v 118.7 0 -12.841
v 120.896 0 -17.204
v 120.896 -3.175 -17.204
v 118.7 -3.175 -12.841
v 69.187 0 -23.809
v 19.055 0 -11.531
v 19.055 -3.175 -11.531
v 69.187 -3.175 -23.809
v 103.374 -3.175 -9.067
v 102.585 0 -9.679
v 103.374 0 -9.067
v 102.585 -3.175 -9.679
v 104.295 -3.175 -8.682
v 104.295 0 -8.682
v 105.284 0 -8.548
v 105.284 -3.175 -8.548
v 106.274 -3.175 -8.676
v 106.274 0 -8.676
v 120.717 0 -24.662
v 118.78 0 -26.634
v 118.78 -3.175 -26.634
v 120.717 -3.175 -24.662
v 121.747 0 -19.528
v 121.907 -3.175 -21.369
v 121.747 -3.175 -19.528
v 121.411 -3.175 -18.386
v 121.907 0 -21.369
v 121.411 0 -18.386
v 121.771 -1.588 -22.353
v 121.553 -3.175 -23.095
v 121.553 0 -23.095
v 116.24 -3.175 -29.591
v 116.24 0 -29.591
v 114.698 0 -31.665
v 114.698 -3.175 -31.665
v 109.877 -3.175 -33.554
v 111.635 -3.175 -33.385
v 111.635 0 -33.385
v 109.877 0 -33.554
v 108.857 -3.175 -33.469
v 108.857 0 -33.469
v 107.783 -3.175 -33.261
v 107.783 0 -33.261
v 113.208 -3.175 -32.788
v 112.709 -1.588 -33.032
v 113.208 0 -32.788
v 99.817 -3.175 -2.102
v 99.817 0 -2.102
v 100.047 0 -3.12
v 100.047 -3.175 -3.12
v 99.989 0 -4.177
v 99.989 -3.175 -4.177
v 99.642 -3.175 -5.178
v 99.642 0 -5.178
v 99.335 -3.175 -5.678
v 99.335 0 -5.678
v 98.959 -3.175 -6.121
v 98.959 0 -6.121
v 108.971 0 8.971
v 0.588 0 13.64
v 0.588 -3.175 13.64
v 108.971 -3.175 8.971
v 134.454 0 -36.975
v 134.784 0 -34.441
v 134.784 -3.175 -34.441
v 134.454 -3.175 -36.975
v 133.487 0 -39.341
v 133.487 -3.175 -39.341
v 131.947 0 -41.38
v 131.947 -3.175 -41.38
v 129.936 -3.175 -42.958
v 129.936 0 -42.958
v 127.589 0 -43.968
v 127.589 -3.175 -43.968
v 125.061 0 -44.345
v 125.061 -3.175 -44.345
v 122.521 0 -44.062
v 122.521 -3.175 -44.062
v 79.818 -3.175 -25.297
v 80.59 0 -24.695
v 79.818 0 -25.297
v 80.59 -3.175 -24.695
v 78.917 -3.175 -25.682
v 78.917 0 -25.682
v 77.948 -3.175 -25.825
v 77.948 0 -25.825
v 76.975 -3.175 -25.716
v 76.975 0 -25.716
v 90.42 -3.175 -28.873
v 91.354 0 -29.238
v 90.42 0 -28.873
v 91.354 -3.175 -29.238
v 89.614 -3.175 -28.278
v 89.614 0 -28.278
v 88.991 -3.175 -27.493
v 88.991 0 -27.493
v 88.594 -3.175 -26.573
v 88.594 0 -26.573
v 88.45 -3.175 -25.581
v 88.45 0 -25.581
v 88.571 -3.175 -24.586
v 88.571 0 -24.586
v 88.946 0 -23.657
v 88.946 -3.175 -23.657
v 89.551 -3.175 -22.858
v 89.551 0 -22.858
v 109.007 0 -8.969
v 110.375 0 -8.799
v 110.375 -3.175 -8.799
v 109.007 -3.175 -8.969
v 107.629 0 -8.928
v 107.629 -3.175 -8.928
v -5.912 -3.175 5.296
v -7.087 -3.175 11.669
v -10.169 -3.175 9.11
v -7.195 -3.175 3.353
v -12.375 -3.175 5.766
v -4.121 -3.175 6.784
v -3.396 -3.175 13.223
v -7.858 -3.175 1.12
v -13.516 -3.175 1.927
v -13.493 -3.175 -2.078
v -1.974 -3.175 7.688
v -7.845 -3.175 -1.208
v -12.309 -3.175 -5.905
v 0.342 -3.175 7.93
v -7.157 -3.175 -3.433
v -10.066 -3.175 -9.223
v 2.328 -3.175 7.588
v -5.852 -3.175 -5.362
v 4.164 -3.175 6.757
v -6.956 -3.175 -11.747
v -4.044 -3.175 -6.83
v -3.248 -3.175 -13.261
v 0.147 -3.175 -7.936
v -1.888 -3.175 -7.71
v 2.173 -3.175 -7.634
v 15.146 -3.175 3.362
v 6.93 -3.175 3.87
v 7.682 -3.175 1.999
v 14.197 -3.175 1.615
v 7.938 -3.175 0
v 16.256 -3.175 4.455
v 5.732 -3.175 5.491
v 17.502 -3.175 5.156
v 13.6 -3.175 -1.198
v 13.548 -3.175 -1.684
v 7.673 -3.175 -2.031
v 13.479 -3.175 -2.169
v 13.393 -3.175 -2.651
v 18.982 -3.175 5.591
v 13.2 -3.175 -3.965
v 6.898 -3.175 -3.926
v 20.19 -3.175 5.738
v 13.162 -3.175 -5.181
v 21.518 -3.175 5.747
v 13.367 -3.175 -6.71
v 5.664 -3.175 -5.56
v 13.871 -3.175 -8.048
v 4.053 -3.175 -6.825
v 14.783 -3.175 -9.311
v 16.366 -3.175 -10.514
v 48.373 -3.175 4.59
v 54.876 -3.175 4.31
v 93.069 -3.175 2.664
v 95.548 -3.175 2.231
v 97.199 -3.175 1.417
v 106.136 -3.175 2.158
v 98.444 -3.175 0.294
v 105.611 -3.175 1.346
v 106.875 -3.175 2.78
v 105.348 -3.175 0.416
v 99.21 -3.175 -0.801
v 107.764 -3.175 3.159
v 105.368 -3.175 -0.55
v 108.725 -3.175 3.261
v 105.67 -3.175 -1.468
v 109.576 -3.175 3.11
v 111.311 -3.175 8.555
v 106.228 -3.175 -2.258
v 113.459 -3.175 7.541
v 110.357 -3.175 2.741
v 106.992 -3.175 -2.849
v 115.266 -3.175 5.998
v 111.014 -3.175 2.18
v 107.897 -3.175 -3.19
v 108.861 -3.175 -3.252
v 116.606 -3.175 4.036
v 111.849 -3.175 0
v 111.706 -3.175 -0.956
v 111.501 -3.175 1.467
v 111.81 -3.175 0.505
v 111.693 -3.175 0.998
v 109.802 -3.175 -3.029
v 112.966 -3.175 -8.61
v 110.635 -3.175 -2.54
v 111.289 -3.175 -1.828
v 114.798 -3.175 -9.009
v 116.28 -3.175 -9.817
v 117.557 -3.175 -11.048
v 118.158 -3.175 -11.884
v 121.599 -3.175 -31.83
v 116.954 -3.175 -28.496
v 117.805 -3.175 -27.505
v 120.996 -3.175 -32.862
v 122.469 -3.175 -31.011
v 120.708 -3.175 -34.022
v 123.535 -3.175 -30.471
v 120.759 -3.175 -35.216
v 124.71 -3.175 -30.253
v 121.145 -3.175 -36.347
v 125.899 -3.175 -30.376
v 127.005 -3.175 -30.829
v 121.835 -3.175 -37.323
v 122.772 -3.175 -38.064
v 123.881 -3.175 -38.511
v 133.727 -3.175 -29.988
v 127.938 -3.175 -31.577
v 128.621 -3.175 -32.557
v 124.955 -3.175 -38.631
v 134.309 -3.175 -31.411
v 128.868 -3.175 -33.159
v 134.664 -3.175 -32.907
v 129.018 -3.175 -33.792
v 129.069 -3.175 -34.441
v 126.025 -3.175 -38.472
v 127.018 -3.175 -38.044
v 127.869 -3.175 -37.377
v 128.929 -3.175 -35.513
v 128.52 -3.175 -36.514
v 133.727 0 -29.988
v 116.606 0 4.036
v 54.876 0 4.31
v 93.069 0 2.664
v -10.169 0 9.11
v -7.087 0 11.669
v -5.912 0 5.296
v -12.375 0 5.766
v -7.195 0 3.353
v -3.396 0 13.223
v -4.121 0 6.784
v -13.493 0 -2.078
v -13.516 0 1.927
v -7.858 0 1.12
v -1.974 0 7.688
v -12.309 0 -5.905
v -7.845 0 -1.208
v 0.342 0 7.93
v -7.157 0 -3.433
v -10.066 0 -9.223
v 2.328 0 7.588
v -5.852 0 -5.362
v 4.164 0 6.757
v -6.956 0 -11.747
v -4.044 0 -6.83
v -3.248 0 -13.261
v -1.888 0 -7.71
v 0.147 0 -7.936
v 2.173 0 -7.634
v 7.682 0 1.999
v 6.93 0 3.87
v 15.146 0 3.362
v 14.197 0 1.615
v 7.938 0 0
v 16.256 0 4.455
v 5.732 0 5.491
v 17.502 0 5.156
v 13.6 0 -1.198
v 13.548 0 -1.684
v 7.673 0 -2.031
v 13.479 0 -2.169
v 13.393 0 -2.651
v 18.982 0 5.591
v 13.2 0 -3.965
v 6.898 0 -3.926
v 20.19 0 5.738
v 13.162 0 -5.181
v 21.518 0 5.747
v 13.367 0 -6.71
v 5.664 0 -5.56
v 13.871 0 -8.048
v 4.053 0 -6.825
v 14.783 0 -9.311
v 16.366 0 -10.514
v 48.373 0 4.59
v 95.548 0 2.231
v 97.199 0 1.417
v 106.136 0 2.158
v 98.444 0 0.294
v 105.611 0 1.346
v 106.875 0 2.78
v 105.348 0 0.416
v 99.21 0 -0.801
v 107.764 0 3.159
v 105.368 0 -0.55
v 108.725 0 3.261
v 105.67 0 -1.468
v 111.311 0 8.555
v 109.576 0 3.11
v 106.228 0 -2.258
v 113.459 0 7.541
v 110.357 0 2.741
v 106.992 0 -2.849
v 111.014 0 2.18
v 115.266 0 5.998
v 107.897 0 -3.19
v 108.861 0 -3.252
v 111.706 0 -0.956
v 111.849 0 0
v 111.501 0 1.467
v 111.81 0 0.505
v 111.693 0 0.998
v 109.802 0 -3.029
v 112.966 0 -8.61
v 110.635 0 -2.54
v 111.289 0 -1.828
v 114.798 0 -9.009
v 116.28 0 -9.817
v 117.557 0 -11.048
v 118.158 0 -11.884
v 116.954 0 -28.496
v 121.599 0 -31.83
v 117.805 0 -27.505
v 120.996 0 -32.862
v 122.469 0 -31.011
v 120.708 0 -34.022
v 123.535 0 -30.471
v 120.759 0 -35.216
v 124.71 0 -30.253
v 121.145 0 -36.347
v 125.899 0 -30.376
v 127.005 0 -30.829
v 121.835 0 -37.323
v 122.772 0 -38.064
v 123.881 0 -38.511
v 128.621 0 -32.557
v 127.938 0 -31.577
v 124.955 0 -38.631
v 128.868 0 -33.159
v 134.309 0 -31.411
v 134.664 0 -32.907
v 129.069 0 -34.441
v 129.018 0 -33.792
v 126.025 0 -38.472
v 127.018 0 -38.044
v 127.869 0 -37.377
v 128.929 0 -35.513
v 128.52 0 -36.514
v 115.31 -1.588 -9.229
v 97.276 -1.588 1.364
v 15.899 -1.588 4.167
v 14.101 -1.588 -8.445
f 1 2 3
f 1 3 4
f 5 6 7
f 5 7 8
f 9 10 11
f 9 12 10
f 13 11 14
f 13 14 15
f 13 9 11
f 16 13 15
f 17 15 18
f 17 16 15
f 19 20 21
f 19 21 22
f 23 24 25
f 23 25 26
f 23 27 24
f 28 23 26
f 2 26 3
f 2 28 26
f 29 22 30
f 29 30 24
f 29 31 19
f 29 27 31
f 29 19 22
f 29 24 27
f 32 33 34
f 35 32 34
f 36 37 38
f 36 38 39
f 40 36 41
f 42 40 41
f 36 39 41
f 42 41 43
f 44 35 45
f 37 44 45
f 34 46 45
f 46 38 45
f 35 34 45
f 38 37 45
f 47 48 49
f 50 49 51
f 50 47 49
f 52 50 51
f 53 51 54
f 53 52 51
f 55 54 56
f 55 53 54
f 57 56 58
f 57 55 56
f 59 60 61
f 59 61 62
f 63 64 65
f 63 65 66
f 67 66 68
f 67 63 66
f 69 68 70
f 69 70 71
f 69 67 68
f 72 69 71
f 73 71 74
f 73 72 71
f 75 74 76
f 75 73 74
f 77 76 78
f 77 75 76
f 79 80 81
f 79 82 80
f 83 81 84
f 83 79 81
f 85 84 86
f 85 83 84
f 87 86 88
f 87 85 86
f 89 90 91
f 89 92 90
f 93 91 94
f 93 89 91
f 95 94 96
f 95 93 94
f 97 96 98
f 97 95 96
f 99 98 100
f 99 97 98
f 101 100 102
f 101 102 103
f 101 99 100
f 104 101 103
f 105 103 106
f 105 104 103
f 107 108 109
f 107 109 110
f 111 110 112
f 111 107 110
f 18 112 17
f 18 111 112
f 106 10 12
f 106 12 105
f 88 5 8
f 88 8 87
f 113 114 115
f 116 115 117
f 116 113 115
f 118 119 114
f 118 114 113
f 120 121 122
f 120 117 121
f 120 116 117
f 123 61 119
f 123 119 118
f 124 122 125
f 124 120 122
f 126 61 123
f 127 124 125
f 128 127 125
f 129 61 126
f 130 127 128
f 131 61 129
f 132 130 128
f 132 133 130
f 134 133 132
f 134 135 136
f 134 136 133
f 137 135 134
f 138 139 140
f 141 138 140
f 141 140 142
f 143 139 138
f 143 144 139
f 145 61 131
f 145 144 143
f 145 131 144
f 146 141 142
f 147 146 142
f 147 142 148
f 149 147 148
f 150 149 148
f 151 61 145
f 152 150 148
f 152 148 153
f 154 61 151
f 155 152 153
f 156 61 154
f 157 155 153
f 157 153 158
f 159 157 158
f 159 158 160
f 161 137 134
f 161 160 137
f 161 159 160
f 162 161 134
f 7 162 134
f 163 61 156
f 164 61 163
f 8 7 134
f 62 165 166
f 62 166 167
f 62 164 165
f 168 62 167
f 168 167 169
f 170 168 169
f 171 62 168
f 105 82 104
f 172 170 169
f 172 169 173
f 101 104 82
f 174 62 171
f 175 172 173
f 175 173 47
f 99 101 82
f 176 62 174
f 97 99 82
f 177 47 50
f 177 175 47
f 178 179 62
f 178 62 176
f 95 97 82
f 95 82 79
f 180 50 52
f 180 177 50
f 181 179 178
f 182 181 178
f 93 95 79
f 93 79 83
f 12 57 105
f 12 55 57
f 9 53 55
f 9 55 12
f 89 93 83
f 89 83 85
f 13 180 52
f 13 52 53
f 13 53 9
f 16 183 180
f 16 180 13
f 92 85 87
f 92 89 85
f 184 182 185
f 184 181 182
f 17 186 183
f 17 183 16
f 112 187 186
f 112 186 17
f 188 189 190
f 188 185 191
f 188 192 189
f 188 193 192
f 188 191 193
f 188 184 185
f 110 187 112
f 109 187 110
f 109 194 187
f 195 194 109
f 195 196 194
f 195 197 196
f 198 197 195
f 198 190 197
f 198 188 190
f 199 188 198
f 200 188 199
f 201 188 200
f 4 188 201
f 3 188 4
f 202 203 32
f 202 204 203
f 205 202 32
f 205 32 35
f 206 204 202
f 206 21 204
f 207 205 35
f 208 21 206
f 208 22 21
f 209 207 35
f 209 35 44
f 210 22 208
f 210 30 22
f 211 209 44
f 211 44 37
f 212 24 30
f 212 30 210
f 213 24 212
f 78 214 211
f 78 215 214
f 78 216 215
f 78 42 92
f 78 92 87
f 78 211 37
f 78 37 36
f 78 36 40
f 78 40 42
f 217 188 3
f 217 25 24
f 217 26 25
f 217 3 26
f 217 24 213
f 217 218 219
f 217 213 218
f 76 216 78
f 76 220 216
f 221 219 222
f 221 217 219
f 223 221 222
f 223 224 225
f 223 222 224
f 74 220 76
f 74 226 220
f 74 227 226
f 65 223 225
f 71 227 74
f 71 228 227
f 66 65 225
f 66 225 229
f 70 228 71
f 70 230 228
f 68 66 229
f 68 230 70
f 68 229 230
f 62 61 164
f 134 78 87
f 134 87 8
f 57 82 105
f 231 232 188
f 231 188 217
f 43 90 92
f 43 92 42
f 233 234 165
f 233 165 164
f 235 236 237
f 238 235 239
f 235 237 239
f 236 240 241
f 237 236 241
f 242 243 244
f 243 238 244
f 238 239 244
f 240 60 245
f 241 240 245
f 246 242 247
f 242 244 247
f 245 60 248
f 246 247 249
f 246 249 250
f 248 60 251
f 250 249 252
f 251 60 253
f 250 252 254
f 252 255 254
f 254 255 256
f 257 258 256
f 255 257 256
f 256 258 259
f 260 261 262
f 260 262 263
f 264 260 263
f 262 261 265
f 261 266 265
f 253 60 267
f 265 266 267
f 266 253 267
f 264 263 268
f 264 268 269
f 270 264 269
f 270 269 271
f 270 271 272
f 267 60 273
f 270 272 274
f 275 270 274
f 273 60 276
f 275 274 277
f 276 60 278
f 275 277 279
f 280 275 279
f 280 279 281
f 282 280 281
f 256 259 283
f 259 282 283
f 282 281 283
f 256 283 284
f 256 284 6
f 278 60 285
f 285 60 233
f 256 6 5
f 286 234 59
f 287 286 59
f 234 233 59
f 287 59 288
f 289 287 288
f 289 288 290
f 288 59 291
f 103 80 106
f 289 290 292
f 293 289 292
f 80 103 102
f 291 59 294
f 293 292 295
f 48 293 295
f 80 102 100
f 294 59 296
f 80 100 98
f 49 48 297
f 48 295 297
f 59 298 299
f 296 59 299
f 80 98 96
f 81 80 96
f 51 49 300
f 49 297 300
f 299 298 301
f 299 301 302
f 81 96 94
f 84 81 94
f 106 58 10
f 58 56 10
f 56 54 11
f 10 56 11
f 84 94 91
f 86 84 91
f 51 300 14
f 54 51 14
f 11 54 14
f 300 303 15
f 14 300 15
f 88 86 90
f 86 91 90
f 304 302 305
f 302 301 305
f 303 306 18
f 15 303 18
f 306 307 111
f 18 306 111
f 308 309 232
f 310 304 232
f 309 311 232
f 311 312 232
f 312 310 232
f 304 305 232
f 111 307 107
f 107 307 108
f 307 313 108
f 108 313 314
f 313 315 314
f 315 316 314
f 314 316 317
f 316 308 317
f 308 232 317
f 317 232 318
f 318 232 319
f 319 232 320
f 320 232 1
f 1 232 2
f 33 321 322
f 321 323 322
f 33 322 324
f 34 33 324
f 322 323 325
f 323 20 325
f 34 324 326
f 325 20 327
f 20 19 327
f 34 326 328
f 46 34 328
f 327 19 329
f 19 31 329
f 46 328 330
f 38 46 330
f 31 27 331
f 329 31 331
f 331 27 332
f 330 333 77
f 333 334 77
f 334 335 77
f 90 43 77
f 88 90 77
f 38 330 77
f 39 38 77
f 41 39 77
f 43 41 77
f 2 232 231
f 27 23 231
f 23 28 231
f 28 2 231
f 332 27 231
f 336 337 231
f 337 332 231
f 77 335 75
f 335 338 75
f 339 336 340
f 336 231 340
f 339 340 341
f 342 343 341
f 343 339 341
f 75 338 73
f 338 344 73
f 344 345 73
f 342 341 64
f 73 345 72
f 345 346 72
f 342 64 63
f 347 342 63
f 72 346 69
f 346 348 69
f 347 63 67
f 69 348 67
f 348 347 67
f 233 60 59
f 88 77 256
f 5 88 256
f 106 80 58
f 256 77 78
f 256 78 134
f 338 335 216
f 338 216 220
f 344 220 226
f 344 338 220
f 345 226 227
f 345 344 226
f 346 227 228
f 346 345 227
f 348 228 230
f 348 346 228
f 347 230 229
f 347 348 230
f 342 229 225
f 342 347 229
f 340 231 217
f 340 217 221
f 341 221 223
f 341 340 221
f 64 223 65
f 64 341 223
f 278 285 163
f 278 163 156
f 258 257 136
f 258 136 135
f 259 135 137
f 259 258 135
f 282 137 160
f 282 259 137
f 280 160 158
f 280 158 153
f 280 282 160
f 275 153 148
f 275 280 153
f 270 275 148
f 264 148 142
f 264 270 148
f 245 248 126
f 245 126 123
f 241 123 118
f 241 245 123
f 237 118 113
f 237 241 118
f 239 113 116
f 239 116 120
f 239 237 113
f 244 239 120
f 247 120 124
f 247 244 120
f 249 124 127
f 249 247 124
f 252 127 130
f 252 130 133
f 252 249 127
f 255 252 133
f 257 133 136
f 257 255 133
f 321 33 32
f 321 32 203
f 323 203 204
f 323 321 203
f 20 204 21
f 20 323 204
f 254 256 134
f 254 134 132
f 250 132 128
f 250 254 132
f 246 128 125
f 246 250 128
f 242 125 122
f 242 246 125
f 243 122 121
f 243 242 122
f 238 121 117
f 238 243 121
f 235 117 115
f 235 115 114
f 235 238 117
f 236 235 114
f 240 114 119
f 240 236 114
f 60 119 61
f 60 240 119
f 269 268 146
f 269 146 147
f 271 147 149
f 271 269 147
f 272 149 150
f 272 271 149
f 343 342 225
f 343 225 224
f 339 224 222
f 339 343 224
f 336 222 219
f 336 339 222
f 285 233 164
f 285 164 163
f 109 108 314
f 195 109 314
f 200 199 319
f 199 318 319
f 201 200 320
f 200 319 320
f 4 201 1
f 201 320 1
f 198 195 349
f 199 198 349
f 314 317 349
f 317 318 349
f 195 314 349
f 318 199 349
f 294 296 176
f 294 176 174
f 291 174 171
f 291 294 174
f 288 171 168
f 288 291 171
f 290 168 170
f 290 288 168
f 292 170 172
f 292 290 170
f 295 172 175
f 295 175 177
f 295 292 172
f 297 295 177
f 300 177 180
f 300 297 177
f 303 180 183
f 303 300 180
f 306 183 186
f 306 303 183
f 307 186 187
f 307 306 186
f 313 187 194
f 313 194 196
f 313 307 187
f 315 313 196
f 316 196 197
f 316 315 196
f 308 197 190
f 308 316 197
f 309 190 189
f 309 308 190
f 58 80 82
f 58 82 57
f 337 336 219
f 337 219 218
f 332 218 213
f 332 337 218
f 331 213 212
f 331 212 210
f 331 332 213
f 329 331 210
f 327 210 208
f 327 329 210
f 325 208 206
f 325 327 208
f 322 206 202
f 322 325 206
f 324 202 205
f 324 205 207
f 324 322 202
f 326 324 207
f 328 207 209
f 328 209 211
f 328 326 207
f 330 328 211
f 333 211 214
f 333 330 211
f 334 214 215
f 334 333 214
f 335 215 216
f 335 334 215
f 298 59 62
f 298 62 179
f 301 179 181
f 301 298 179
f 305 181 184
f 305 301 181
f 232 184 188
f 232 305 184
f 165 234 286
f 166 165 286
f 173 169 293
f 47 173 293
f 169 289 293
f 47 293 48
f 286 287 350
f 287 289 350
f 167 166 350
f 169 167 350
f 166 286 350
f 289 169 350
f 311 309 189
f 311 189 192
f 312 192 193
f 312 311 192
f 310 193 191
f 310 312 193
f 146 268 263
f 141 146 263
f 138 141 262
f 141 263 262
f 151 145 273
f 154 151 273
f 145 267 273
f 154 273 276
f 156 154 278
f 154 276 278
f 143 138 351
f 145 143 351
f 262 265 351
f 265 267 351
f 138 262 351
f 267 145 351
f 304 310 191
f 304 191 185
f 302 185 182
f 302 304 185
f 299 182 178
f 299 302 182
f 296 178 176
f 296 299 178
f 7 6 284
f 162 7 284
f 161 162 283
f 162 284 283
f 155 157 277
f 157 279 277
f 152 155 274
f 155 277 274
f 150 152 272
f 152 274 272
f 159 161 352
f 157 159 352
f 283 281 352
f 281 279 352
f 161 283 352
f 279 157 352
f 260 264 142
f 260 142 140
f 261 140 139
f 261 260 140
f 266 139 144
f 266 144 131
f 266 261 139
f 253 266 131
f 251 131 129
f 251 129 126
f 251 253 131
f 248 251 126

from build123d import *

# Parameters (mm, degrees)
BOSS_EXTRUDE4_DEPTH = 3.175
FILLET2_R           = 3.81


with BuildPart() as part:
    # Sketch1 → Boss-Extrude4 (new body)
    with BuildSketch(Plane(origin=(0, 0, 0), x_dir=(1, 0, 0), z_dir=(0, 1, 0))):
        with BuildLine():
            ThreePointArc((134.783763158, 34.440613651), (130.992755953, 42.233924829), (122.521356715, 44.06226552))
            ThreePointArc((122.521356715, 44.06226552), (117.722413764, 41.291147284), (115.162703171, 36.376187325))
            Line((115.162703171, 36.376187325), (123.88082197, 38.511312519))
            ThreePointArc((123.88082197, 38.511312519), (127.464875494, 37.737783765), (129.068763158, 34.440613651))
            ThreePointArc((129.068763158, 34.440613651), (128.955414212, 33.4725006), (128.621498601, 32.556754332))
            Line((128.621498601, 32.556754332), (124.58688197, 24.538885311))
            ThreePointArc((124.58688197, 24.538885311), (129.950478116, 25.932006306), (133.726592386, 29.98785526))
            ThreePointArc((133.726592386, 29.98785526), (134.515847468, 32.152346439), (134.783763158, 34.440613651))
        make_face()
        with BuildLine():
            Line((123.88082197, 38.511312519), (115.162703171, 36.376187325))
            ThreePointArc((115.162703171, 36.376187325), (115.052676855, 35.70414645), (114.98908268, 35.026134276))
            ThreePointArc((114.98908268, 35.026134276), (117.127915131, 28.270630543), (123.232258698, 24.672238604))
            ThreePointArc((123.232258698, 24.672238604), (123.907277135, 24.582267295), (124.58688197, 24.538885311))
            Line((124.58688197, 24.538885311), (128.621498601, 32.556754332))
            ThreePointArc((128.621498601, 32.556754332), (121.5989813, 31.830236182), (123.88082197, 38.511312519))
        make_face()
        with BuildLine():
            Line((122.521356715, 44.06226552), (-3.247611444, 13.260609947))
            ThreePointArc((-3.247611444, 13.260609947), (3.178857668, 13.277259513), (8.900967118, 10.351982448))
            Line((8.900967118, 10.351982448), (70.354618788, 25.402389875))
            Line((70.354618788, 25.402389875), (78.030840873, 27.282347644))
            Line((78.030840873, 27.282347644), (83.782484894, 28.690963463))
            Line((83.782484894, 28.690963463), (115.162703171, 36.376187325))
            ThreePointArc((115.162703171, 36.376187325), (117.722413764, 41.291147284), (122.521356715, 44.06226552))
        make_face()
        with BuildLine():
            ThreePointArc((8.900967118, 10.351982448), (3.178857668, 13.277259513), (-3.247611444, 13.260609947))
            ThreePointArc((-3.247611444, 13.260609947), (-13.515826194, -1.926966151), (0.587616374, -13.639848359))
            ThreePointArc((0.587616374, -13.639848359), (3.65523919, -13.15408616), (6.533692532, -11.987560976))
            ThreePointArc((6.533692532, -11.987560976), (9.268219921, -10.024512744), (11.439307143, -7.452047258))
            Line((11.439307143, -7.452047258), (0.341637427, -7.930144395))
            ThreePointArc((0.341637427, -7.930144395), (-7.858038485, -1.120329158), (-1.888146188, 7.709656946))
            Line((-1.888146188, 7.709656946), (8.900967118, 10.351982448))
        make_face()
        with BuildLine():
            ThreePointArc((9.985636063, 9.310092839), (9.457659775, 9.845985366), (8.900967118, 10.351982448))
            Line((8.900967118, 10.351982448), (-1.888146188, 7.709656946))
            ThreePointArc((-1.888146188, 7.709656946), (4.899833971, 6.244640367), (7.9375, 0))
            ThreePointArc((7.9375, 0), (5.732174689, -5.490544562), (0.341637427, -7.930144395))
            Line((0.341637427, -7.930144395), (11.439307143, -7.452047258))
            ThreePointArc((11.439307143, -7.452047258), (11.832412595, -6.810636419), (12.189591197, -6.148546389))
            ThreePointArc((12.189591197, -6.148546389), (13.281738404, -3.160091963), (13.6525, 0))
            ThreePointArc((13.6525, 0), (12.702748769, 5.003092039), (9.985636063, 9.310092839))
        make_face()
        with BuildLine():
            Line((70.354618788, 25.402389875), (8.900967118, 10.351982448))
            ThreePointArc((8.900967118, 10.351982448), (9.457659775, 9.845985366), (9.985636063, 9.310092839))
            Line((9.985636063, 9.310092839), (69.18664036, 23.808811963))
            Line((69.18664036, 23.808811963), (70.354618788, 25.402389875))
        make_face()
        with BuildLine():
            ThreePointArc((12.189591197, -6.148546389), (11.832412595, -6.810636419), (11.439307143, -7.452047258))
            Line((11.439307143, -7.452047258), (47.410466333, -5.902378846))
            Line((47.410466333, -5.902378846), (48.372525925, -4.589754505))
            Line((48.372525925, -4.589754505), (12.189591197, -6.148546389))
        make_face()
        with BuildLine():
            ThreePointArc((6.533692532, -11.987560976), (3.65523919, -13.15408616), (0.587616374, -13.639848359))
            Line((0.587616374, -13.639848359), (108.971460257, -8.970579339))
            ThreePointArc((108.971460257, -8.970579339), (108.77827491, -8.976819594), (108.585, -8.9789))
            ThreePointArc((108.585, -8.9789), (103.680463266, -7.521048108), (100.368568874, -3.620898335))
            Line((100.368568874, -3.620898335), (53.914169694, -5.622193724))
            Line((53.914169694, -5.622193724), (47.410466333, -5.902378846))
            Line((47.410466333, -5.902378846), (11.439307143, -7.452047258))
            ThreePointArc((11.439307143, -7.452047258), (9.268219921, -10.024512744), (6.533692532, -11.987560976))
        make_face()
        with BuildLine():
            Line((53.914169694, -5.622193724), (100.368568874, -3.620898335))
            ThreePointArc((100.368568874, -3.620898335), (100.12320514, -3.003110548), (99.924218758, -2.368863331))
            Line((99.924218758, -2.368863331), (54.876229285, -4.309569382))
            Line((54.876229285, -4.309569382), (53.914169694, -5.622193724))
        make_face()
        Polygon((48.372525925, -4.589754505), (47.410466333, -5.902378846), (53.914169694, -5.622193724), (54.876229285, -4.309569382), align=None)
        with BuildLine():
            Line((104.335087932, 7.90941797), (84.823475635, 27.638376771))
            Line((84.823475635, 27.638376771), (79.071831614, 26.229760952))
            Line((79.071831614, 26.229760952), (100.723144875, 4.337266328))
            ThreePointArc((100.723144875, 4.337266328), (102.271221973, 6.384109354), (104.335087932, 7.90941797))
        make_face()
        Polygon((78.030840873, 27.282347644), (70.354618788, 25.402389875), (69.18664036, 23.808811963), (76.862862445, 25.688769732), align=None)
        Polygon((84.823475635, 27.638376771), (83.782484894, 28.690963463), (78.030840873, 27.282347644), (79.071831614, 26.229760952), align=None)
        with BuildLine():
            ThreePointArc((114.98908268, 35.026134276), (115.052676855, 35.70414645), (115.162703171, 36.376187325))
            Line((115.162703171, 36.376187325), (83.782484894, 28.690963463))
            Line((83.782484894, 28.690963463), (84.823475635, 27.638376771))
            Line((84.823475635, 27.638376771), (114.98908268, 35.026134276))
        make_face()
        Polygon((79.071831614, 26.229760952), (78.030840873, 27.282347644), (76.862862445, 25.688769732), align=None)
        with BuildLine():
            Line((116.60566957, -4.036025875), (133.726592386, 29.98785526))
            ThreePointArc((133.726592386, 29.98785526), (129.950478116, 25.932006306), (124.58688197, 24.538885311))
            Line((124.58688197, 24.538885311), (115.260501822, 6.004858086))
            ThreePointArc((115.260501822, 6.004858086), (116.968296145, 3.21574112), (117.5639, 0))
            ThreePointArc((117.5639, 0), (117.321058471, -2.07410887), (116.60566957, -4.036025875))
        make_face()
        with BuildLine():
            ThreePointArc((108.585, -8.9789), (108.77827491, -8.976819594), (108.971460257, -8.970579339))
            ThreePointArc((108.971460257, -8.970579339), (113.459157615, -7.540771363), (116.60566957, -4.036025875))
            ThreePointArc((116.60566957, -4.036025875), (117.321058471, -2.07410887), (117.5639, 0))
            ThreePointArc((117.5639, 0), (116.968296145, 3.21574112), (115.260501822, 6.004858086))
            Line((115.260501822, 6.004858086), (111.500575784, -1.467126803))
            ThreePointArc((111.500575784, -1.467126803), (110.356794211, -2.741129053), (108.72548131, -3.260875375))
            Line((108.72548131, -3.260875375), (100.368568874, -3.620898335))
            ThreePointArc((100.368568874, -3.620898335), (103.680463266, -7.521048108), (108.585, -8.9789))
        make_face()
        with BuildLine():
            ThreePointArc((99.924218758, -2.368863331), (100.12320514, -3.003110548), (100.368568874, -3.620898335))
            Line((100.368568874, -3.620898335), (108.72548131, -3.260875375))
            ThreePointArc((108.72548131, -3.260875375), (106.227929768, 2.257711924), (111.8489, 0))
            ThreePointArc((111.8489, 0), (111.760625215, -0.75395471), (111.500575784, -1.467126803))
            Line((111.500575784, -1.467126803), (115.260501822, 6.004858086))
            ThreePointArc((115.260501822, 6.004858086), (114.79795902, 6.482266998), (114.301364272, 6.924147942))
            ThreePointArc((114.301364272, 6.924147942), (109.468351444, 8.935341932), (104.335087932, 7.90941797))
            ThreePointArc((104.335087932, 7.90941797), (102.271221973, 6.384109354), (100.723144875, 4.337266328))
            ThreePointArc((100.723144875, 4.337266328), (99.66914772, 1.062178575), (99.924218758, -2.368863331))
        make_face()
    extrude(amount=-BOSS_EXTRUDE4_DEPTH)

    # Fillet1
    # a fillet whose section is not a circle: 7.62 mm, written as the material it adds along each edge
    with BuildSketch(Plane(origin=(115.260501822, 0, -6.004858086), x_dir=(-0.8680919950979774, 0, -0.49640335217120884), z_dir=(0, -1, 0))) as fillet1_piece_1:
        with BuildLine():
            Bezier((5.628236023, 0), (0.097286133, 1.825453133), (0.407253439, 7.641603586), weights=[1, 1, 1])
            Line((0.407253439, 7.641603586), (0, 0))
            ThreePointArc((0, 0), (2.814118011, 0.452389282), (5.628236023, 0))
        make_face()
    extrude(amount=3.175)
    with BuildSketch(Plane(origin=(124.58688197, 0, -24.538885311), x_dir=(-0.940652377409321, 0, -0.3393716323946247), z_dir=(0, -1, 0))) as fillet1_piece_2:
        with BuildLine():
            Bezier((6.173495259, 0), (0.234745196, -1.947499202), (0.982676409, -8.152505596), weights=[1, 1, 1])
            Line((0.982676409, -8.152505596), (0, 0))
            ThreePointArc((0, 0), (3.08674763, -0.493198872), (6.173495259, 0))
        make_face()
    extrude(amount=3.175)
    with BuildSketch(Plane(origin=(114.98908268, 0, -35.026134276), x_dir=(0.22431195725050157, 0, 0.9745173912426853), z_dir=(0, -1, 0))) as fillet1_piece_3:
        with BuildLine():
            Bezier((5.577498608, 0), (0.022723171, 1.629700449), (0.103430981, 7.418045632), weights=[1, 1, 1])
            Line((0.103430981, 7.418045632), (0, 0))
            ThreePointArc((0, 0), (2.788749304, 0.400648175), (5.577498608, 0))
        make_face()
    extrude(amount=3.175)
    with BuildSketch(Plane(origin=(9.985636063, 0, -9.310092839), x_dir=(0.9712953632492297, 0, -0.23787668513443458), z_dir=(0, -1, 0))) as fillet1_piece_4:
        with BuildLine():
            Bezier((9.337508644, 0), (2.051395042, 0), (1.725151149, 7.27880597), weights=[1, 1, 1])
            ThreePointArc((1.725151149, 7.27880597), (1.370821683, 3.518943481), (0, 0))
            Line((0, 0), (9.337508644, 0))
        make_face()
    extrude(amount=3.175)
    with BuildSketch(Plane(origin=(99.924218758, 0, 2.368863331), x_dir=(-0.9990733095506228, 0, 0.04304093567251452), z_dir=(0, -1, 0))) as fillet1_piece_5:
        with BuildLine():
            Bezier((6.861639494, 0), (1.507461334, 0), (-0.307306015, 5.037245601), weights=[1, 1, 1])
            ThreePointArc((-0.307306015, 5.037245601), (0.207524079, 2.540657043), (0, 0))
            Line((0, 0), (6.861639494, 0))
        make_face()
    extrude(amount=3.175)
    with BuildSketch(Plane(origin=(12.189591197, 0, 6.148546389), x_dir=(0.18852682154069017, 0, -0.9820680412068018), z_dir=(0, -1, 0))) as fillet1_piece_6:
        with BuildLine():
            Bezier((7.480452048, 0), (0.473095274, 1.996096811), (2.153427849, 9.085803001), weights=[1, 1, 1])
            Line((2.153427849, 9.085803001), (0, 0))
            ThreePointArc((0, 0), (3.740226024, 0.522326142), (7.480452048, 0))
        make_face()
    extrude(amount=3.175)

    # Fillet2
    fillet2_edges = [part.edges().sort_by_distance(p)[0] for p in [
        (104.335087932, -1.5875, -7.90941797),
        (100.723144875, -1.5875, -4.337266328),
        (84.823475635, -1.5875, -27.638376771),
        (79.071831614, -1.5875, -26.229760952),
    ]]
    fillet(fillet2_edges, radius=FILLET2_R)


solid = part.part
